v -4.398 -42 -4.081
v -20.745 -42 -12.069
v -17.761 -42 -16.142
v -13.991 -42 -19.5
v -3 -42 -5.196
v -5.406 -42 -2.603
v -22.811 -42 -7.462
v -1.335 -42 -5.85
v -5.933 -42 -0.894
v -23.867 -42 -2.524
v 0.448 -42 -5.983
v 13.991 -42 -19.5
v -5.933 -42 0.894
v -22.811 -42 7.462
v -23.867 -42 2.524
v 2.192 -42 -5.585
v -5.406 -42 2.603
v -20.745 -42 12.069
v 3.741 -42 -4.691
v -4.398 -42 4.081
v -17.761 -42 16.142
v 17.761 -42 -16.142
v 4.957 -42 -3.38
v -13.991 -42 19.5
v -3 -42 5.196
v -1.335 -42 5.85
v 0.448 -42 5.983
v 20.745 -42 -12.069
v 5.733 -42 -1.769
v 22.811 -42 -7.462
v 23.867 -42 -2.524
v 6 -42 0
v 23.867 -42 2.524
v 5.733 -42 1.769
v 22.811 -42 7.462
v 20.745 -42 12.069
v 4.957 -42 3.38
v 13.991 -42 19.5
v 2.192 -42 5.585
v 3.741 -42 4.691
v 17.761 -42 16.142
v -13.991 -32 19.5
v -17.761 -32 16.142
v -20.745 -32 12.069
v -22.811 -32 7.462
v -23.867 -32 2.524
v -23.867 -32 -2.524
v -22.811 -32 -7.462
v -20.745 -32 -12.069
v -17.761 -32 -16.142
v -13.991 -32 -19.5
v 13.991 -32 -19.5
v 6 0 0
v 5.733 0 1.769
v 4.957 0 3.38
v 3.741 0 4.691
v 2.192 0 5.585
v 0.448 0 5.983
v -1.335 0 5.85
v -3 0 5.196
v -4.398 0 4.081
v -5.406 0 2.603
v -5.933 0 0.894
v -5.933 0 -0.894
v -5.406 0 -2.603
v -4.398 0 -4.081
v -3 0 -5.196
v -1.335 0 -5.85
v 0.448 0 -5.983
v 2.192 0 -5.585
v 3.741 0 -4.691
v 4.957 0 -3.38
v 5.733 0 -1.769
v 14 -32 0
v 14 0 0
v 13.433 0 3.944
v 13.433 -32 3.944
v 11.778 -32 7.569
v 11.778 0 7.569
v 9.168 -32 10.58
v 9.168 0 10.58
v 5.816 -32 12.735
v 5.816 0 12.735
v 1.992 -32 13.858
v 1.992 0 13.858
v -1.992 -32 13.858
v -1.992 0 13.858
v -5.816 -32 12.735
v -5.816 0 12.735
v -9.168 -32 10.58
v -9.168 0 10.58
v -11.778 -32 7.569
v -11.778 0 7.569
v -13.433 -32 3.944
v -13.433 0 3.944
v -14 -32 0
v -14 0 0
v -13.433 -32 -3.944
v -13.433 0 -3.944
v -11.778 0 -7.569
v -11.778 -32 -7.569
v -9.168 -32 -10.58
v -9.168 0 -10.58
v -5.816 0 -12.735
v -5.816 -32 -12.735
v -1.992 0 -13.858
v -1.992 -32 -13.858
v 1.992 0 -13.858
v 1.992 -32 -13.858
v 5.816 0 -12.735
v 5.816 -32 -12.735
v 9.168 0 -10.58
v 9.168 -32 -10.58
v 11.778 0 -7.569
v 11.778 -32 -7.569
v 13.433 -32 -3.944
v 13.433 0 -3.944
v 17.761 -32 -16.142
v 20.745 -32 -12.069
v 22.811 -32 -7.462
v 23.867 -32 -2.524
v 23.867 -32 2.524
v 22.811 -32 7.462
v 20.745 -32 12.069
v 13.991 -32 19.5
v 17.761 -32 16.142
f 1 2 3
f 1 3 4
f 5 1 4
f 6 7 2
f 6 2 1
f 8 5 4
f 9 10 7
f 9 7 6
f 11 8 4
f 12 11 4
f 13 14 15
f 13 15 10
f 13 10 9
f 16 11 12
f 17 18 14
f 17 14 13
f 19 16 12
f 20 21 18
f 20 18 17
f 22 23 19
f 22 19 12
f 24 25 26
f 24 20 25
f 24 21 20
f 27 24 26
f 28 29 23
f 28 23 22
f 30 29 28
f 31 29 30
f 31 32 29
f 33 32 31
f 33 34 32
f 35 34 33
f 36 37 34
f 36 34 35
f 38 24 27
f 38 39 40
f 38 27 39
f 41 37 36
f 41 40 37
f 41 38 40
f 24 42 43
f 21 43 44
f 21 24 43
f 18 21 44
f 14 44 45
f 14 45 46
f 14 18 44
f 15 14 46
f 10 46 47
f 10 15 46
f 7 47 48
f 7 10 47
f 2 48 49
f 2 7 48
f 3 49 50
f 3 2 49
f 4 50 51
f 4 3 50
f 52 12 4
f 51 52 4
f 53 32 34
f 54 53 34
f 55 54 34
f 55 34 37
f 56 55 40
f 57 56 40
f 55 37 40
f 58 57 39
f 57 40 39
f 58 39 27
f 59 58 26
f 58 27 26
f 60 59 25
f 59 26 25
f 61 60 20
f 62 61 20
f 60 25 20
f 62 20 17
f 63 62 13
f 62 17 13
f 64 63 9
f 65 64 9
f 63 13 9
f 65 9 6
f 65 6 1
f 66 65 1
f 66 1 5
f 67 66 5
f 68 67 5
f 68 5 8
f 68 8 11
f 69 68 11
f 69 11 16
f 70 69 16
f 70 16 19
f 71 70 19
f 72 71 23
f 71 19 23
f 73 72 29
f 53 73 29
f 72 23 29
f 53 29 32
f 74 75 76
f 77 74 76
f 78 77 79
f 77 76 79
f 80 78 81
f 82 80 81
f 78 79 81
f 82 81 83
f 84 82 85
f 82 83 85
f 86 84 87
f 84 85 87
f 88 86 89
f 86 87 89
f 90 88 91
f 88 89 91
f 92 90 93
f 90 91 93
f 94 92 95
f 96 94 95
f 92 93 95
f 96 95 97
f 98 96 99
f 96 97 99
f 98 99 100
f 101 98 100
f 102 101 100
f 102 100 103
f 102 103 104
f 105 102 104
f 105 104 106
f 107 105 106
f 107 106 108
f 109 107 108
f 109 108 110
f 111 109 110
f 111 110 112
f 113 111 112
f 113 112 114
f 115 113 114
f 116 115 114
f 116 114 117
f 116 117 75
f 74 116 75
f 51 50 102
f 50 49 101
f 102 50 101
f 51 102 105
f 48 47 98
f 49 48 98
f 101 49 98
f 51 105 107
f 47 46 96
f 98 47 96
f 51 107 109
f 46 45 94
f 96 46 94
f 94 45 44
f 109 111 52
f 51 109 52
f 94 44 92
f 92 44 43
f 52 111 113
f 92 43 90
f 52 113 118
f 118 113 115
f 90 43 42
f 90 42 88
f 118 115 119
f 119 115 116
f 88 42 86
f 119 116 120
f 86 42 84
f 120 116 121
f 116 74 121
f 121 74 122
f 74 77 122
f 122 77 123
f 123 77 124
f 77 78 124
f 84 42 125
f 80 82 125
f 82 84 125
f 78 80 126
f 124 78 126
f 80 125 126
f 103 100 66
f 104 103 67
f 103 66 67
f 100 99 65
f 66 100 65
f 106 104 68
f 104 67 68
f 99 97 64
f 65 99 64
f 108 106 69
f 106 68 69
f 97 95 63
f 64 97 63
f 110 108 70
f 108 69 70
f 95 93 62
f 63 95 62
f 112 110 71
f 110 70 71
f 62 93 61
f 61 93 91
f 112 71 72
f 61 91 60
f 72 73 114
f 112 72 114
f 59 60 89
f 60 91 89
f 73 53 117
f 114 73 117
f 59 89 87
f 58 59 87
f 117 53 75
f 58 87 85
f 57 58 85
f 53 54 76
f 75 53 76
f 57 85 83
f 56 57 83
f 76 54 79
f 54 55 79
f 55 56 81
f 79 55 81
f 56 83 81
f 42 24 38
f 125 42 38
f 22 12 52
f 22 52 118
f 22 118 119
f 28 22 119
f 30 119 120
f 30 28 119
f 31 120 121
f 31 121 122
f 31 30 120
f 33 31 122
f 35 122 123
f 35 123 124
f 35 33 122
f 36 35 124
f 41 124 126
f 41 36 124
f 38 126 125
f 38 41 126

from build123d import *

# Parameters (mm, degrees)
F0_R     = 14
F1_DEPTH = 42
F2_R     = 6
F3_DEPTH = 42
F4_R     = 24
F4_R_2   = 14
F5_DEPTH = 10
F7_DEPTH = 10


with BuildPart() as f1:
    # F0 (on Front) → F1 (new body)
    with BuildSketch(Plane.XZ):
        Circle(F0_R)
    extrude(amount=F1_DEPTH)

    # F2 (on face) → F3 (cut, through all)
    with BuildSketch(Plane.XZ.offset(42)):
        Circle(F2_R)
    extrude(amount=-F3_DEPTH, mode=Mode.SUBTRACT)

    # F4 (on face) → F5 (join)
    with BuildSketch(Plane.XZ.offset(42)):
        Circle(F4_R)
        Circle(F4_R_2, mode=Mode.SUBTRACT)
    extrude(amount=-F5_DEPTH)

    # F6 (on face) → F7 (cut, through all)
    with BuildSketch(Plane.XZ.offset(42)):
        with BuildLine():
            ThreePointArc((13.9910685796, 19.5), (0, 24), (-13.9910685796, 19.5))
            Line((-13.9910685796, 19.5), (13.9910685796, 19.5))
        make_face()
        with BuildLine():
            Line((13.9910685796, -19.5), (-13.9910685796, -19.5))
            ThreePointArc((-13.9910685796, -19.5), (0, -24), (13.9910685796, -19.5))
        make_face()
    extrude(amount=-F7_DEPTH, mode=Mode.SUBTRACT)


solid = f1.part
